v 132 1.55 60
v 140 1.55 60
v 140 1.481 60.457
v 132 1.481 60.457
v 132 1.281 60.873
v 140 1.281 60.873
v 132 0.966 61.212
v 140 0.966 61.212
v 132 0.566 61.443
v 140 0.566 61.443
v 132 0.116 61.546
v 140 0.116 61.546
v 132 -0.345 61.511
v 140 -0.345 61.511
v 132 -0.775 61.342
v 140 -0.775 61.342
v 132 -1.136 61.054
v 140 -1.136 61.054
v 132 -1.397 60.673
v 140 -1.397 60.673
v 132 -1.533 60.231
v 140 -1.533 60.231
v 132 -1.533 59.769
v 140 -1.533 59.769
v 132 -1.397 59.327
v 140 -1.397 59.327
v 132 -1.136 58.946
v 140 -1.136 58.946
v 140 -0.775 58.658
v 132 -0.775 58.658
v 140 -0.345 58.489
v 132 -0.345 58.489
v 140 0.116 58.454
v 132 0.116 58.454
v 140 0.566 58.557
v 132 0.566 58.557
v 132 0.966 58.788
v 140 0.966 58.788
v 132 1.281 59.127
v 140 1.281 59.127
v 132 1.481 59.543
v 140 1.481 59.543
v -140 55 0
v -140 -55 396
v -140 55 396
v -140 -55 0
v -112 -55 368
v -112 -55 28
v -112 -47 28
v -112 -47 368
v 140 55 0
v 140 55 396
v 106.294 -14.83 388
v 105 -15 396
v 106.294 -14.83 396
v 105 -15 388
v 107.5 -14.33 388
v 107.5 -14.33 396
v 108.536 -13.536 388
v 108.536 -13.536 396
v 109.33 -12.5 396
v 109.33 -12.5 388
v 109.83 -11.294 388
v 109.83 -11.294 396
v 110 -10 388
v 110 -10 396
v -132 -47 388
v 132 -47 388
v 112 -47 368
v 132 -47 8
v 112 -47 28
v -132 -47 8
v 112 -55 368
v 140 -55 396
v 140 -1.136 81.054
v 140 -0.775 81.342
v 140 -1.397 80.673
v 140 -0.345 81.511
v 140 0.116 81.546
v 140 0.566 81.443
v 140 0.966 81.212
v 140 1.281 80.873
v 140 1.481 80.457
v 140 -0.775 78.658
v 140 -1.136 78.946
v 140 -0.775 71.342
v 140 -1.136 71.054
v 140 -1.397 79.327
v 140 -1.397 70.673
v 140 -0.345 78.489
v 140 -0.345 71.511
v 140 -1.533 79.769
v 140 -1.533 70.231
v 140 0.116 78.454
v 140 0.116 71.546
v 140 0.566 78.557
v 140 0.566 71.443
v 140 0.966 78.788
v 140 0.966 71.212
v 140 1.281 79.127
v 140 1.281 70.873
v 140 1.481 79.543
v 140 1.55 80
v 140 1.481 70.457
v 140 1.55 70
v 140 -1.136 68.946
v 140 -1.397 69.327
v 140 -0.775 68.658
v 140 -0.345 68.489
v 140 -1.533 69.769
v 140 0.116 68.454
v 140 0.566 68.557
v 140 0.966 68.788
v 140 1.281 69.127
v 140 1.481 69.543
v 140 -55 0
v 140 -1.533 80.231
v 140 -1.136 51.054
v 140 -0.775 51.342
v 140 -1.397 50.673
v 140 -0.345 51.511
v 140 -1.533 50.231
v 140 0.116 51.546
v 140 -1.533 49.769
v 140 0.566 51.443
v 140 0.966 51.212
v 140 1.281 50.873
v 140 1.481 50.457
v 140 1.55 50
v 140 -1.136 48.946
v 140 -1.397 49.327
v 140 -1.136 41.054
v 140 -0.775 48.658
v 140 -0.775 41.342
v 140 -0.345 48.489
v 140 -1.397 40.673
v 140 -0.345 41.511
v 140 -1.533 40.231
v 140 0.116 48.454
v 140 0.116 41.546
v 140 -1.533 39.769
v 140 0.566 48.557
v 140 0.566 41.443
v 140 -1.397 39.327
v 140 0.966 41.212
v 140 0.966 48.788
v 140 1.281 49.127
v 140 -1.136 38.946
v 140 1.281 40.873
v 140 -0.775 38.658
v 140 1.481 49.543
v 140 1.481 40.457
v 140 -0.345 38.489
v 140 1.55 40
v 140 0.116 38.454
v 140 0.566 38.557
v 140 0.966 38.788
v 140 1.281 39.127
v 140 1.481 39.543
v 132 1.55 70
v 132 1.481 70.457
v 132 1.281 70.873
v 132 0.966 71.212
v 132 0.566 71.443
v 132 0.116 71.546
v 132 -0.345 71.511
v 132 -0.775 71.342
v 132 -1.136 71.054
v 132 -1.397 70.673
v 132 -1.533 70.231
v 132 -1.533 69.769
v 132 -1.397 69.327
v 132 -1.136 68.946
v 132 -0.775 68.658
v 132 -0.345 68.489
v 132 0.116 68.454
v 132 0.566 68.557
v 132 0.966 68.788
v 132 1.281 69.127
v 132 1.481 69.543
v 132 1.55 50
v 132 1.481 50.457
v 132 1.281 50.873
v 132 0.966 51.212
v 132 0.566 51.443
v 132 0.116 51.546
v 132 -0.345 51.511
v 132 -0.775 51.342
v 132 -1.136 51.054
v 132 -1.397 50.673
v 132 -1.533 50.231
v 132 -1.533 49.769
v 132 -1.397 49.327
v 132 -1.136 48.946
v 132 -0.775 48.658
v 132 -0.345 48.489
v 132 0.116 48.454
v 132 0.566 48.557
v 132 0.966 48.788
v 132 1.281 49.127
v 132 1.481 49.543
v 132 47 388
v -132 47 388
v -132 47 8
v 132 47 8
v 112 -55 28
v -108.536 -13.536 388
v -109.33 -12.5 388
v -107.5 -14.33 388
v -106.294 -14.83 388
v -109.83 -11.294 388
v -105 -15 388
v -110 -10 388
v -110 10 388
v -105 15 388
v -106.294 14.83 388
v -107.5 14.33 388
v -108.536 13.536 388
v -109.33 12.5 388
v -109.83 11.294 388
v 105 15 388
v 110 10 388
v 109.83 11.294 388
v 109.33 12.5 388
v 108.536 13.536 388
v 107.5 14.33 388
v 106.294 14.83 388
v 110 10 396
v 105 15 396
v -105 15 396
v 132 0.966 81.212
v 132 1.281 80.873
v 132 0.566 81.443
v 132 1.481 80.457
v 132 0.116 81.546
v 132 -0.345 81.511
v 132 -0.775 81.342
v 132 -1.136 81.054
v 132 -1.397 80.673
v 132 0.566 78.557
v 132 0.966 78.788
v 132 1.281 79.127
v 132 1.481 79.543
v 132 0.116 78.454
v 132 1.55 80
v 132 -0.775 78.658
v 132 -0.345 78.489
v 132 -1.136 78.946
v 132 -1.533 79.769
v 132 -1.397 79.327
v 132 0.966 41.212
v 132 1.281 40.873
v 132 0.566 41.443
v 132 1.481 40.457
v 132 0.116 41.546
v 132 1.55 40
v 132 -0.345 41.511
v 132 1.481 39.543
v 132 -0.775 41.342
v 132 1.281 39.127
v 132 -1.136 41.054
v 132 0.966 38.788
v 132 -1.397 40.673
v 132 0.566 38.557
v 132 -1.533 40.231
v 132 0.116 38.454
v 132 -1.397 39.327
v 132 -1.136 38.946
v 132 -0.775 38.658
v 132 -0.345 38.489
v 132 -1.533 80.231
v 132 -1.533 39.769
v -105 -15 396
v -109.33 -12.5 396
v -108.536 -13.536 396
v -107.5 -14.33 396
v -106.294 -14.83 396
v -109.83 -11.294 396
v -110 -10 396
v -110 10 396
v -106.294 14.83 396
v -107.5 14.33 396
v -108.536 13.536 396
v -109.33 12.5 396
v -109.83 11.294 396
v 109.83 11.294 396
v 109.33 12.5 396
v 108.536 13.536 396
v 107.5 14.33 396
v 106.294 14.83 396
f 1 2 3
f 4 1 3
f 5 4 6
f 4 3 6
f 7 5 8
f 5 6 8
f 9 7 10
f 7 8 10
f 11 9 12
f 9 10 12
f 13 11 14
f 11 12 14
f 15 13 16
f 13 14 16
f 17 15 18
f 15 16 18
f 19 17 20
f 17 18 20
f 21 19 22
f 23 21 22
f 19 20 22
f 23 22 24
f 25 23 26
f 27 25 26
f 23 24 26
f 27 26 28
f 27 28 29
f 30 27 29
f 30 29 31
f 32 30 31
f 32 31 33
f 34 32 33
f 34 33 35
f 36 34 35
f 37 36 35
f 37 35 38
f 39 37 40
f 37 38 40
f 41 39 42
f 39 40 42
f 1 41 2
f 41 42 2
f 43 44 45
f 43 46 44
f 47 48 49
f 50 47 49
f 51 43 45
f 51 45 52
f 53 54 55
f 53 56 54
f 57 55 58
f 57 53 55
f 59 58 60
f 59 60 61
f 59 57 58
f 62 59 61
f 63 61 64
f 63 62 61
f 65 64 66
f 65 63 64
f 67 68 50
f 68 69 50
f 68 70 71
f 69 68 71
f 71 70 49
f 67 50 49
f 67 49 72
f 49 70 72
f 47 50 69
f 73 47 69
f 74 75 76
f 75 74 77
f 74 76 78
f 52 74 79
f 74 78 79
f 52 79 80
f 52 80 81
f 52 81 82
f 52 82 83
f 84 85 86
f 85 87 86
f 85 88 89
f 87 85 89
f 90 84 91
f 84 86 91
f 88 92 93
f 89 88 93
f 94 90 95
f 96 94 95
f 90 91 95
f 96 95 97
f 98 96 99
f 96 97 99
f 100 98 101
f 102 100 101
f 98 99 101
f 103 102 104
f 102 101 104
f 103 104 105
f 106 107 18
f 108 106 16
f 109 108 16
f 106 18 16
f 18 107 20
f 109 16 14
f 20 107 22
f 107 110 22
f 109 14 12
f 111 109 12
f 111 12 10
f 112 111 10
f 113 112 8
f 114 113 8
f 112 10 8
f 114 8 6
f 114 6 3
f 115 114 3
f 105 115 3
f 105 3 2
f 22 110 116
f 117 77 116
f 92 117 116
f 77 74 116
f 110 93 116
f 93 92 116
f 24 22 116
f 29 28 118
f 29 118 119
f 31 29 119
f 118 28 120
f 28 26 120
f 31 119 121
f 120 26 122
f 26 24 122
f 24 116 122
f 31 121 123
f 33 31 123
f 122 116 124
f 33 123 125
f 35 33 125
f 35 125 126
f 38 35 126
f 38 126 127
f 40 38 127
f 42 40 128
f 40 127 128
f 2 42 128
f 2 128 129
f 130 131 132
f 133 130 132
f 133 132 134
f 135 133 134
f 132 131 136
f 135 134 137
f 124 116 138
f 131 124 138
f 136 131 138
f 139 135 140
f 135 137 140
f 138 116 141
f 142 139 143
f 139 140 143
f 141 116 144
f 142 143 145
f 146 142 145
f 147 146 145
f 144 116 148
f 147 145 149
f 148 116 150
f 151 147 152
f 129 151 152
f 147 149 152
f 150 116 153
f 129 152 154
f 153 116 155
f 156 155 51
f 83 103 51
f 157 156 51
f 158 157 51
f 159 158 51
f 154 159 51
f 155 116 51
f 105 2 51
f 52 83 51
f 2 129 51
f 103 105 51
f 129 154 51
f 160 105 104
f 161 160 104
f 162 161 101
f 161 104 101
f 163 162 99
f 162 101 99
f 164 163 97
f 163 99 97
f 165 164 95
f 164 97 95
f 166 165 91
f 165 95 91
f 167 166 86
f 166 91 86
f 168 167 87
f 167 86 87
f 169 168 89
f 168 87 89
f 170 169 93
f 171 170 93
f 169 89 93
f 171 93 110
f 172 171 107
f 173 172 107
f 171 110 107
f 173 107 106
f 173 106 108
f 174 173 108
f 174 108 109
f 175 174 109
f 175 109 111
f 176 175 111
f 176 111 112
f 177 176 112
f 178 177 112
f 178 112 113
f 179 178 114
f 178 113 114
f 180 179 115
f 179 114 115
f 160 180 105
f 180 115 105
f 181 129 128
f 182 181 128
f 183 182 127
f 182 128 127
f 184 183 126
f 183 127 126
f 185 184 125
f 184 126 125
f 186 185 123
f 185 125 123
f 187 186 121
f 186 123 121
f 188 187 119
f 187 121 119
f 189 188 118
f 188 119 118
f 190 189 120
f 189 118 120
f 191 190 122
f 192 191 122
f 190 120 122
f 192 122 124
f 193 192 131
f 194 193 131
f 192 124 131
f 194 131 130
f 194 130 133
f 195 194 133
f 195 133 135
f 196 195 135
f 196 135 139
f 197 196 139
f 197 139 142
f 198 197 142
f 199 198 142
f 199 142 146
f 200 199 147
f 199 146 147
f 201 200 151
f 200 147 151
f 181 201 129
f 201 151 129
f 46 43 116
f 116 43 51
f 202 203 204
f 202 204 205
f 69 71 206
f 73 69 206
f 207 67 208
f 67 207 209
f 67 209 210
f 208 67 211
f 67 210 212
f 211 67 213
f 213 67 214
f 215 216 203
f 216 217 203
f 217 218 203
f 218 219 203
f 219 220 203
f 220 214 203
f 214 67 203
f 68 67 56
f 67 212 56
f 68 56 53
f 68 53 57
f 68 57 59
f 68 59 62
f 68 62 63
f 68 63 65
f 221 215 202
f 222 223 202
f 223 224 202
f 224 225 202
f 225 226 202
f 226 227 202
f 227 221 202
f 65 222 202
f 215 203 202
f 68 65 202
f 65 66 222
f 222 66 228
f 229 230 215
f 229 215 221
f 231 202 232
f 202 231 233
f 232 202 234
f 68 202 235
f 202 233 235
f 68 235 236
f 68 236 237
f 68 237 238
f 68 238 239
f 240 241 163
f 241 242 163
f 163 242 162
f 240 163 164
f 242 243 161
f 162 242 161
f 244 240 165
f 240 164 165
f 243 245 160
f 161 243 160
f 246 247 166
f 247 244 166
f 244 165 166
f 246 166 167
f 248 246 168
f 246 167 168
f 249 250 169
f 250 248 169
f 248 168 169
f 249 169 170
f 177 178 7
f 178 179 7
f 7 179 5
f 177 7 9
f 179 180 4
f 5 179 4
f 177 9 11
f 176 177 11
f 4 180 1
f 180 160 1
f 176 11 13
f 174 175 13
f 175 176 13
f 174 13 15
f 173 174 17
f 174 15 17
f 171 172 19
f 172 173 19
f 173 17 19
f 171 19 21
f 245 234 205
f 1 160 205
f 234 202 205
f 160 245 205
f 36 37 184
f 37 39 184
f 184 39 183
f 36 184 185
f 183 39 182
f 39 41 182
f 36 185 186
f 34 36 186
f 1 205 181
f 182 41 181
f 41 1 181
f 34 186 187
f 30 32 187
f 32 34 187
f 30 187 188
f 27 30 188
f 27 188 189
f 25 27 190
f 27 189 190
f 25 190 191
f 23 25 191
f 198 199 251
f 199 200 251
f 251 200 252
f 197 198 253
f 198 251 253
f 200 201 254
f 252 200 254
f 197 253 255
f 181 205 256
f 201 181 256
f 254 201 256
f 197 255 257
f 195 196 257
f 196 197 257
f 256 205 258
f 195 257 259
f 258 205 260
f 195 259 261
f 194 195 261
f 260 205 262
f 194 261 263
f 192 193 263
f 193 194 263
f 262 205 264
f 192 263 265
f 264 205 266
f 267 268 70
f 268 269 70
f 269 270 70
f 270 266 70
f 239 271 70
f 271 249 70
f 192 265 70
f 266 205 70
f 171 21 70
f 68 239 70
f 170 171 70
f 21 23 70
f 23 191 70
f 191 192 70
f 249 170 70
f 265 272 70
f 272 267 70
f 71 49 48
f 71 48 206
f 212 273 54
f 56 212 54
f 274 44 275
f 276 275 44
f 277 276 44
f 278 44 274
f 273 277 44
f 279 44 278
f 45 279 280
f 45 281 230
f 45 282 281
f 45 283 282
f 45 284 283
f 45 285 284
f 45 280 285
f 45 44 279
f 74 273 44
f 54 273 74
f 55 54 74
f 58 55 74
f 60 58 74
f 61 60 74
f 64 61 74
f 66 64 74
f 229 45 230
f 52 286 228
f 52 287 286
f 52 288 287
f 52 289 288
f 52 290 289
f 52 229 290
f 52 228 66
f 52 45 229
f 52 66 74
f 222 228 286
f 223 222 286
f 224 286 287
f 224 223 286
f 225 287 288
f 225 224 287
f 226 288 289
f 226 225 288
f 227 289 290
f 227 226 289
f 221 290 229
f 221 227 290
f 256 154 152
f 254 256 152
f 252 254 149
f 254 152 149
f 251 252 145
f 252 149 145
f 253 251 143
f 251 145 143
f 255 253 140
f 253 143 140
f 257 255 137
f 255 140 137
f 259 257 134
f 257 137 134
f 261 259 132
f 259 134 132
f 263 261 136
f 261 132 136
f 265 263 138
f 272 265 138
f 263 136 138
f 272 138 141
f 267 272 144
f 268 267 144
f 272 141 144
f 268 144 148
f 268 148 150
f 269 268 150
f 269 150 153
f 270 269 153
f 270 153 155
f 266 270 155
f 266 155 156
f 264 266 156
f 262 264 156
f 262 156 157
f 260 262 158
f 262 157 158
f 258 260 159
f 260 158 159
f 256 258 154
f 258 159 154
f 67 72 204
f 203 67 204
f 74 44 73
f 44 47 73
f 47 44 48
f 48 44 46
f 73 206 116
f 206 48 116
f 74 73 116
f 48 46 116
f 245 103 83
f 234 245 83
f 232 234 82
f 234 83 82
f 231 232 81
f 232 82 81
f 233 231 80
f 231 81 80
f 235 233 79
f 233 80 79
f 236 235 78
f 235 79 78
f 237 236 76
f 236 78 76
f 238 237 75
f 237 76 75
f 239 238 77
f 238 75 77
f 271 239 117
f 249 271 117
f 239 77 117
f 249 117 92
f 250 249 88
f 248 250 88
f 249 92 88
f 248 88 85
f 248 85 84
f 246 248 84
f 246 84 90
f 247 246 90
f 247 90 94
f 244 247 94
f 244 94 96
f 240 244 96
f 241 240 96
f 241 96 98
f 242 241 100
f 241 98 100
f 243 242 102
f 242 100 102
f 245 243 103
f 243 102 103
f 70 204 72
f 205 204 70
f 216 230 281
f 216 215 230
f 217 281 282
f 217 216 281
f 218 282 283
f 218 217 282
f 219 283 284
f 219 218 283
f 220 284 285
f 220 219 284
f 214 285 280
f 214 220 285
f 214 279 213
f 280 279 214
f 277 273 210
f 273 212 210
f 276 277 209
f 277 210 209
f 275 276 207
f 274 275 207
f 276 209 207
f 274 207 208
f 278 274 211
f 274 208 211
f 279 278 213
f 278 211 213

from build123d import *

# Parameters (mm, degrees)
F0_W      = 280
F0_H      = 110
F1_DEPTH  = 8
F2_W      = 280
F2_H      = 110
F2_W_2    = 264
F2_H_2    = 94
F3_DEPTH  = 20
F5_DEPTH  = 340
F6_W      = 224
F6_H      = 8
F7_DEPTH  = 20
F8_W      = 280
F8_H      = 110
F8_W_2    = 264
F8_H_2    = 94
F9_DEPTH  = 8
F10_R     = 1.55
F11_DEPTH = 8
F12_W     = 220
F12_H     = 30
F13_DEPTH = 8
F14_R     = 5


# Not quite as in the source:
# - a feature names something its author has since deleted; it is built from what else it names


with BuildPart() as f1:
    # F0 (on Top) → F1 (new body)
    with BuildSketch(Plane.XY):
        Rectangle(F0_W, F0_H)
    extrude(amount=F1_DEPTH)

    # F2 (on face) → F3 (join)
    with BuildSketch(Plane.XY.offset(8)):
        Rectangle(F2_W, F2_H)
        Rectangle(F2_W_2, F2_H_2, mode=Mode.SUBTRACT)
    extrude(amount=F3_DEPTH)

    # F4 (on face) → F5 (join)
    with BuildSketch(Plane.XY.offset(28)):
        Polygon((-132, -47), (-132, 47), (132, 47), (132, -47), (112, -47), (112, -55), (140, -55), (140, 55), (-140, 55), (-140, -55), (-112, -55), (-112, -47), align=None)
    extrude(amount=F5_DEPTH)

    # F6 (on face) → F7 (join)
    with BuildSketch(Plane.XY.offset(368)):
        Polygon((-112, -47), (-132, -47), (-132, 47), (132, 47), (132, -47), (112, -47), (112, -55), (140, -55), (140, 55), (-140, 55), (-140, -55), (-112, -55), align=None)
        with Locations((0, -51)):
            Rectangle(F6_W, F6_H)
    extrude(amount=F7_DEPTH)

    # F8 (on face) → F9 (join)
    with BuildSketch(Plane.XY.offset(388)):
        Rectangle(F8_W, F8_H)
        Rectangle(F8_W_2, F8_H_2, mode=Mode.SUBTRACT)
        Rectangle(F8_W_2, F8_H_2)
    extrude(amount=F9_DEPTH)

    # F10 (on face) → F11 (cut, through all)
    with BuildSketch(Plane.YZ.offset(140)):
        with Locations((0, 80)):
            Circle(F10_R)
        with Locations((0, 70)):
            Circle(F10_R)
        with Locations((0, 50)):
            Circle(F10_R)
        with Locations((0, 40)):
            Circle(F10_R)
        with Locations((0, 60)):
            Circle(F10_R)
    extrude(amount=-F11_DEPTH, mode=Mode.SUBTRACT)

    # F12 (on face) → F13 (cut, through all)
    with BuildSketch(Plane.XY.offset(396)):
        Rectangle(F12_W, F12_H)
    extrude(amount=-F13_DEPTH, mode=Mode.SUBTRACT)

    # F14
    f14_edges = [f1.edges().sort_by_distance(p)[0] for p in [
        (-110, 15, 392),
        (-110, -15, 392),
        (110, -15, 392),
        (110, 15, 392),
    ]]
    fillet(f14_edges, radius=F14_R)


solid = f1.part
